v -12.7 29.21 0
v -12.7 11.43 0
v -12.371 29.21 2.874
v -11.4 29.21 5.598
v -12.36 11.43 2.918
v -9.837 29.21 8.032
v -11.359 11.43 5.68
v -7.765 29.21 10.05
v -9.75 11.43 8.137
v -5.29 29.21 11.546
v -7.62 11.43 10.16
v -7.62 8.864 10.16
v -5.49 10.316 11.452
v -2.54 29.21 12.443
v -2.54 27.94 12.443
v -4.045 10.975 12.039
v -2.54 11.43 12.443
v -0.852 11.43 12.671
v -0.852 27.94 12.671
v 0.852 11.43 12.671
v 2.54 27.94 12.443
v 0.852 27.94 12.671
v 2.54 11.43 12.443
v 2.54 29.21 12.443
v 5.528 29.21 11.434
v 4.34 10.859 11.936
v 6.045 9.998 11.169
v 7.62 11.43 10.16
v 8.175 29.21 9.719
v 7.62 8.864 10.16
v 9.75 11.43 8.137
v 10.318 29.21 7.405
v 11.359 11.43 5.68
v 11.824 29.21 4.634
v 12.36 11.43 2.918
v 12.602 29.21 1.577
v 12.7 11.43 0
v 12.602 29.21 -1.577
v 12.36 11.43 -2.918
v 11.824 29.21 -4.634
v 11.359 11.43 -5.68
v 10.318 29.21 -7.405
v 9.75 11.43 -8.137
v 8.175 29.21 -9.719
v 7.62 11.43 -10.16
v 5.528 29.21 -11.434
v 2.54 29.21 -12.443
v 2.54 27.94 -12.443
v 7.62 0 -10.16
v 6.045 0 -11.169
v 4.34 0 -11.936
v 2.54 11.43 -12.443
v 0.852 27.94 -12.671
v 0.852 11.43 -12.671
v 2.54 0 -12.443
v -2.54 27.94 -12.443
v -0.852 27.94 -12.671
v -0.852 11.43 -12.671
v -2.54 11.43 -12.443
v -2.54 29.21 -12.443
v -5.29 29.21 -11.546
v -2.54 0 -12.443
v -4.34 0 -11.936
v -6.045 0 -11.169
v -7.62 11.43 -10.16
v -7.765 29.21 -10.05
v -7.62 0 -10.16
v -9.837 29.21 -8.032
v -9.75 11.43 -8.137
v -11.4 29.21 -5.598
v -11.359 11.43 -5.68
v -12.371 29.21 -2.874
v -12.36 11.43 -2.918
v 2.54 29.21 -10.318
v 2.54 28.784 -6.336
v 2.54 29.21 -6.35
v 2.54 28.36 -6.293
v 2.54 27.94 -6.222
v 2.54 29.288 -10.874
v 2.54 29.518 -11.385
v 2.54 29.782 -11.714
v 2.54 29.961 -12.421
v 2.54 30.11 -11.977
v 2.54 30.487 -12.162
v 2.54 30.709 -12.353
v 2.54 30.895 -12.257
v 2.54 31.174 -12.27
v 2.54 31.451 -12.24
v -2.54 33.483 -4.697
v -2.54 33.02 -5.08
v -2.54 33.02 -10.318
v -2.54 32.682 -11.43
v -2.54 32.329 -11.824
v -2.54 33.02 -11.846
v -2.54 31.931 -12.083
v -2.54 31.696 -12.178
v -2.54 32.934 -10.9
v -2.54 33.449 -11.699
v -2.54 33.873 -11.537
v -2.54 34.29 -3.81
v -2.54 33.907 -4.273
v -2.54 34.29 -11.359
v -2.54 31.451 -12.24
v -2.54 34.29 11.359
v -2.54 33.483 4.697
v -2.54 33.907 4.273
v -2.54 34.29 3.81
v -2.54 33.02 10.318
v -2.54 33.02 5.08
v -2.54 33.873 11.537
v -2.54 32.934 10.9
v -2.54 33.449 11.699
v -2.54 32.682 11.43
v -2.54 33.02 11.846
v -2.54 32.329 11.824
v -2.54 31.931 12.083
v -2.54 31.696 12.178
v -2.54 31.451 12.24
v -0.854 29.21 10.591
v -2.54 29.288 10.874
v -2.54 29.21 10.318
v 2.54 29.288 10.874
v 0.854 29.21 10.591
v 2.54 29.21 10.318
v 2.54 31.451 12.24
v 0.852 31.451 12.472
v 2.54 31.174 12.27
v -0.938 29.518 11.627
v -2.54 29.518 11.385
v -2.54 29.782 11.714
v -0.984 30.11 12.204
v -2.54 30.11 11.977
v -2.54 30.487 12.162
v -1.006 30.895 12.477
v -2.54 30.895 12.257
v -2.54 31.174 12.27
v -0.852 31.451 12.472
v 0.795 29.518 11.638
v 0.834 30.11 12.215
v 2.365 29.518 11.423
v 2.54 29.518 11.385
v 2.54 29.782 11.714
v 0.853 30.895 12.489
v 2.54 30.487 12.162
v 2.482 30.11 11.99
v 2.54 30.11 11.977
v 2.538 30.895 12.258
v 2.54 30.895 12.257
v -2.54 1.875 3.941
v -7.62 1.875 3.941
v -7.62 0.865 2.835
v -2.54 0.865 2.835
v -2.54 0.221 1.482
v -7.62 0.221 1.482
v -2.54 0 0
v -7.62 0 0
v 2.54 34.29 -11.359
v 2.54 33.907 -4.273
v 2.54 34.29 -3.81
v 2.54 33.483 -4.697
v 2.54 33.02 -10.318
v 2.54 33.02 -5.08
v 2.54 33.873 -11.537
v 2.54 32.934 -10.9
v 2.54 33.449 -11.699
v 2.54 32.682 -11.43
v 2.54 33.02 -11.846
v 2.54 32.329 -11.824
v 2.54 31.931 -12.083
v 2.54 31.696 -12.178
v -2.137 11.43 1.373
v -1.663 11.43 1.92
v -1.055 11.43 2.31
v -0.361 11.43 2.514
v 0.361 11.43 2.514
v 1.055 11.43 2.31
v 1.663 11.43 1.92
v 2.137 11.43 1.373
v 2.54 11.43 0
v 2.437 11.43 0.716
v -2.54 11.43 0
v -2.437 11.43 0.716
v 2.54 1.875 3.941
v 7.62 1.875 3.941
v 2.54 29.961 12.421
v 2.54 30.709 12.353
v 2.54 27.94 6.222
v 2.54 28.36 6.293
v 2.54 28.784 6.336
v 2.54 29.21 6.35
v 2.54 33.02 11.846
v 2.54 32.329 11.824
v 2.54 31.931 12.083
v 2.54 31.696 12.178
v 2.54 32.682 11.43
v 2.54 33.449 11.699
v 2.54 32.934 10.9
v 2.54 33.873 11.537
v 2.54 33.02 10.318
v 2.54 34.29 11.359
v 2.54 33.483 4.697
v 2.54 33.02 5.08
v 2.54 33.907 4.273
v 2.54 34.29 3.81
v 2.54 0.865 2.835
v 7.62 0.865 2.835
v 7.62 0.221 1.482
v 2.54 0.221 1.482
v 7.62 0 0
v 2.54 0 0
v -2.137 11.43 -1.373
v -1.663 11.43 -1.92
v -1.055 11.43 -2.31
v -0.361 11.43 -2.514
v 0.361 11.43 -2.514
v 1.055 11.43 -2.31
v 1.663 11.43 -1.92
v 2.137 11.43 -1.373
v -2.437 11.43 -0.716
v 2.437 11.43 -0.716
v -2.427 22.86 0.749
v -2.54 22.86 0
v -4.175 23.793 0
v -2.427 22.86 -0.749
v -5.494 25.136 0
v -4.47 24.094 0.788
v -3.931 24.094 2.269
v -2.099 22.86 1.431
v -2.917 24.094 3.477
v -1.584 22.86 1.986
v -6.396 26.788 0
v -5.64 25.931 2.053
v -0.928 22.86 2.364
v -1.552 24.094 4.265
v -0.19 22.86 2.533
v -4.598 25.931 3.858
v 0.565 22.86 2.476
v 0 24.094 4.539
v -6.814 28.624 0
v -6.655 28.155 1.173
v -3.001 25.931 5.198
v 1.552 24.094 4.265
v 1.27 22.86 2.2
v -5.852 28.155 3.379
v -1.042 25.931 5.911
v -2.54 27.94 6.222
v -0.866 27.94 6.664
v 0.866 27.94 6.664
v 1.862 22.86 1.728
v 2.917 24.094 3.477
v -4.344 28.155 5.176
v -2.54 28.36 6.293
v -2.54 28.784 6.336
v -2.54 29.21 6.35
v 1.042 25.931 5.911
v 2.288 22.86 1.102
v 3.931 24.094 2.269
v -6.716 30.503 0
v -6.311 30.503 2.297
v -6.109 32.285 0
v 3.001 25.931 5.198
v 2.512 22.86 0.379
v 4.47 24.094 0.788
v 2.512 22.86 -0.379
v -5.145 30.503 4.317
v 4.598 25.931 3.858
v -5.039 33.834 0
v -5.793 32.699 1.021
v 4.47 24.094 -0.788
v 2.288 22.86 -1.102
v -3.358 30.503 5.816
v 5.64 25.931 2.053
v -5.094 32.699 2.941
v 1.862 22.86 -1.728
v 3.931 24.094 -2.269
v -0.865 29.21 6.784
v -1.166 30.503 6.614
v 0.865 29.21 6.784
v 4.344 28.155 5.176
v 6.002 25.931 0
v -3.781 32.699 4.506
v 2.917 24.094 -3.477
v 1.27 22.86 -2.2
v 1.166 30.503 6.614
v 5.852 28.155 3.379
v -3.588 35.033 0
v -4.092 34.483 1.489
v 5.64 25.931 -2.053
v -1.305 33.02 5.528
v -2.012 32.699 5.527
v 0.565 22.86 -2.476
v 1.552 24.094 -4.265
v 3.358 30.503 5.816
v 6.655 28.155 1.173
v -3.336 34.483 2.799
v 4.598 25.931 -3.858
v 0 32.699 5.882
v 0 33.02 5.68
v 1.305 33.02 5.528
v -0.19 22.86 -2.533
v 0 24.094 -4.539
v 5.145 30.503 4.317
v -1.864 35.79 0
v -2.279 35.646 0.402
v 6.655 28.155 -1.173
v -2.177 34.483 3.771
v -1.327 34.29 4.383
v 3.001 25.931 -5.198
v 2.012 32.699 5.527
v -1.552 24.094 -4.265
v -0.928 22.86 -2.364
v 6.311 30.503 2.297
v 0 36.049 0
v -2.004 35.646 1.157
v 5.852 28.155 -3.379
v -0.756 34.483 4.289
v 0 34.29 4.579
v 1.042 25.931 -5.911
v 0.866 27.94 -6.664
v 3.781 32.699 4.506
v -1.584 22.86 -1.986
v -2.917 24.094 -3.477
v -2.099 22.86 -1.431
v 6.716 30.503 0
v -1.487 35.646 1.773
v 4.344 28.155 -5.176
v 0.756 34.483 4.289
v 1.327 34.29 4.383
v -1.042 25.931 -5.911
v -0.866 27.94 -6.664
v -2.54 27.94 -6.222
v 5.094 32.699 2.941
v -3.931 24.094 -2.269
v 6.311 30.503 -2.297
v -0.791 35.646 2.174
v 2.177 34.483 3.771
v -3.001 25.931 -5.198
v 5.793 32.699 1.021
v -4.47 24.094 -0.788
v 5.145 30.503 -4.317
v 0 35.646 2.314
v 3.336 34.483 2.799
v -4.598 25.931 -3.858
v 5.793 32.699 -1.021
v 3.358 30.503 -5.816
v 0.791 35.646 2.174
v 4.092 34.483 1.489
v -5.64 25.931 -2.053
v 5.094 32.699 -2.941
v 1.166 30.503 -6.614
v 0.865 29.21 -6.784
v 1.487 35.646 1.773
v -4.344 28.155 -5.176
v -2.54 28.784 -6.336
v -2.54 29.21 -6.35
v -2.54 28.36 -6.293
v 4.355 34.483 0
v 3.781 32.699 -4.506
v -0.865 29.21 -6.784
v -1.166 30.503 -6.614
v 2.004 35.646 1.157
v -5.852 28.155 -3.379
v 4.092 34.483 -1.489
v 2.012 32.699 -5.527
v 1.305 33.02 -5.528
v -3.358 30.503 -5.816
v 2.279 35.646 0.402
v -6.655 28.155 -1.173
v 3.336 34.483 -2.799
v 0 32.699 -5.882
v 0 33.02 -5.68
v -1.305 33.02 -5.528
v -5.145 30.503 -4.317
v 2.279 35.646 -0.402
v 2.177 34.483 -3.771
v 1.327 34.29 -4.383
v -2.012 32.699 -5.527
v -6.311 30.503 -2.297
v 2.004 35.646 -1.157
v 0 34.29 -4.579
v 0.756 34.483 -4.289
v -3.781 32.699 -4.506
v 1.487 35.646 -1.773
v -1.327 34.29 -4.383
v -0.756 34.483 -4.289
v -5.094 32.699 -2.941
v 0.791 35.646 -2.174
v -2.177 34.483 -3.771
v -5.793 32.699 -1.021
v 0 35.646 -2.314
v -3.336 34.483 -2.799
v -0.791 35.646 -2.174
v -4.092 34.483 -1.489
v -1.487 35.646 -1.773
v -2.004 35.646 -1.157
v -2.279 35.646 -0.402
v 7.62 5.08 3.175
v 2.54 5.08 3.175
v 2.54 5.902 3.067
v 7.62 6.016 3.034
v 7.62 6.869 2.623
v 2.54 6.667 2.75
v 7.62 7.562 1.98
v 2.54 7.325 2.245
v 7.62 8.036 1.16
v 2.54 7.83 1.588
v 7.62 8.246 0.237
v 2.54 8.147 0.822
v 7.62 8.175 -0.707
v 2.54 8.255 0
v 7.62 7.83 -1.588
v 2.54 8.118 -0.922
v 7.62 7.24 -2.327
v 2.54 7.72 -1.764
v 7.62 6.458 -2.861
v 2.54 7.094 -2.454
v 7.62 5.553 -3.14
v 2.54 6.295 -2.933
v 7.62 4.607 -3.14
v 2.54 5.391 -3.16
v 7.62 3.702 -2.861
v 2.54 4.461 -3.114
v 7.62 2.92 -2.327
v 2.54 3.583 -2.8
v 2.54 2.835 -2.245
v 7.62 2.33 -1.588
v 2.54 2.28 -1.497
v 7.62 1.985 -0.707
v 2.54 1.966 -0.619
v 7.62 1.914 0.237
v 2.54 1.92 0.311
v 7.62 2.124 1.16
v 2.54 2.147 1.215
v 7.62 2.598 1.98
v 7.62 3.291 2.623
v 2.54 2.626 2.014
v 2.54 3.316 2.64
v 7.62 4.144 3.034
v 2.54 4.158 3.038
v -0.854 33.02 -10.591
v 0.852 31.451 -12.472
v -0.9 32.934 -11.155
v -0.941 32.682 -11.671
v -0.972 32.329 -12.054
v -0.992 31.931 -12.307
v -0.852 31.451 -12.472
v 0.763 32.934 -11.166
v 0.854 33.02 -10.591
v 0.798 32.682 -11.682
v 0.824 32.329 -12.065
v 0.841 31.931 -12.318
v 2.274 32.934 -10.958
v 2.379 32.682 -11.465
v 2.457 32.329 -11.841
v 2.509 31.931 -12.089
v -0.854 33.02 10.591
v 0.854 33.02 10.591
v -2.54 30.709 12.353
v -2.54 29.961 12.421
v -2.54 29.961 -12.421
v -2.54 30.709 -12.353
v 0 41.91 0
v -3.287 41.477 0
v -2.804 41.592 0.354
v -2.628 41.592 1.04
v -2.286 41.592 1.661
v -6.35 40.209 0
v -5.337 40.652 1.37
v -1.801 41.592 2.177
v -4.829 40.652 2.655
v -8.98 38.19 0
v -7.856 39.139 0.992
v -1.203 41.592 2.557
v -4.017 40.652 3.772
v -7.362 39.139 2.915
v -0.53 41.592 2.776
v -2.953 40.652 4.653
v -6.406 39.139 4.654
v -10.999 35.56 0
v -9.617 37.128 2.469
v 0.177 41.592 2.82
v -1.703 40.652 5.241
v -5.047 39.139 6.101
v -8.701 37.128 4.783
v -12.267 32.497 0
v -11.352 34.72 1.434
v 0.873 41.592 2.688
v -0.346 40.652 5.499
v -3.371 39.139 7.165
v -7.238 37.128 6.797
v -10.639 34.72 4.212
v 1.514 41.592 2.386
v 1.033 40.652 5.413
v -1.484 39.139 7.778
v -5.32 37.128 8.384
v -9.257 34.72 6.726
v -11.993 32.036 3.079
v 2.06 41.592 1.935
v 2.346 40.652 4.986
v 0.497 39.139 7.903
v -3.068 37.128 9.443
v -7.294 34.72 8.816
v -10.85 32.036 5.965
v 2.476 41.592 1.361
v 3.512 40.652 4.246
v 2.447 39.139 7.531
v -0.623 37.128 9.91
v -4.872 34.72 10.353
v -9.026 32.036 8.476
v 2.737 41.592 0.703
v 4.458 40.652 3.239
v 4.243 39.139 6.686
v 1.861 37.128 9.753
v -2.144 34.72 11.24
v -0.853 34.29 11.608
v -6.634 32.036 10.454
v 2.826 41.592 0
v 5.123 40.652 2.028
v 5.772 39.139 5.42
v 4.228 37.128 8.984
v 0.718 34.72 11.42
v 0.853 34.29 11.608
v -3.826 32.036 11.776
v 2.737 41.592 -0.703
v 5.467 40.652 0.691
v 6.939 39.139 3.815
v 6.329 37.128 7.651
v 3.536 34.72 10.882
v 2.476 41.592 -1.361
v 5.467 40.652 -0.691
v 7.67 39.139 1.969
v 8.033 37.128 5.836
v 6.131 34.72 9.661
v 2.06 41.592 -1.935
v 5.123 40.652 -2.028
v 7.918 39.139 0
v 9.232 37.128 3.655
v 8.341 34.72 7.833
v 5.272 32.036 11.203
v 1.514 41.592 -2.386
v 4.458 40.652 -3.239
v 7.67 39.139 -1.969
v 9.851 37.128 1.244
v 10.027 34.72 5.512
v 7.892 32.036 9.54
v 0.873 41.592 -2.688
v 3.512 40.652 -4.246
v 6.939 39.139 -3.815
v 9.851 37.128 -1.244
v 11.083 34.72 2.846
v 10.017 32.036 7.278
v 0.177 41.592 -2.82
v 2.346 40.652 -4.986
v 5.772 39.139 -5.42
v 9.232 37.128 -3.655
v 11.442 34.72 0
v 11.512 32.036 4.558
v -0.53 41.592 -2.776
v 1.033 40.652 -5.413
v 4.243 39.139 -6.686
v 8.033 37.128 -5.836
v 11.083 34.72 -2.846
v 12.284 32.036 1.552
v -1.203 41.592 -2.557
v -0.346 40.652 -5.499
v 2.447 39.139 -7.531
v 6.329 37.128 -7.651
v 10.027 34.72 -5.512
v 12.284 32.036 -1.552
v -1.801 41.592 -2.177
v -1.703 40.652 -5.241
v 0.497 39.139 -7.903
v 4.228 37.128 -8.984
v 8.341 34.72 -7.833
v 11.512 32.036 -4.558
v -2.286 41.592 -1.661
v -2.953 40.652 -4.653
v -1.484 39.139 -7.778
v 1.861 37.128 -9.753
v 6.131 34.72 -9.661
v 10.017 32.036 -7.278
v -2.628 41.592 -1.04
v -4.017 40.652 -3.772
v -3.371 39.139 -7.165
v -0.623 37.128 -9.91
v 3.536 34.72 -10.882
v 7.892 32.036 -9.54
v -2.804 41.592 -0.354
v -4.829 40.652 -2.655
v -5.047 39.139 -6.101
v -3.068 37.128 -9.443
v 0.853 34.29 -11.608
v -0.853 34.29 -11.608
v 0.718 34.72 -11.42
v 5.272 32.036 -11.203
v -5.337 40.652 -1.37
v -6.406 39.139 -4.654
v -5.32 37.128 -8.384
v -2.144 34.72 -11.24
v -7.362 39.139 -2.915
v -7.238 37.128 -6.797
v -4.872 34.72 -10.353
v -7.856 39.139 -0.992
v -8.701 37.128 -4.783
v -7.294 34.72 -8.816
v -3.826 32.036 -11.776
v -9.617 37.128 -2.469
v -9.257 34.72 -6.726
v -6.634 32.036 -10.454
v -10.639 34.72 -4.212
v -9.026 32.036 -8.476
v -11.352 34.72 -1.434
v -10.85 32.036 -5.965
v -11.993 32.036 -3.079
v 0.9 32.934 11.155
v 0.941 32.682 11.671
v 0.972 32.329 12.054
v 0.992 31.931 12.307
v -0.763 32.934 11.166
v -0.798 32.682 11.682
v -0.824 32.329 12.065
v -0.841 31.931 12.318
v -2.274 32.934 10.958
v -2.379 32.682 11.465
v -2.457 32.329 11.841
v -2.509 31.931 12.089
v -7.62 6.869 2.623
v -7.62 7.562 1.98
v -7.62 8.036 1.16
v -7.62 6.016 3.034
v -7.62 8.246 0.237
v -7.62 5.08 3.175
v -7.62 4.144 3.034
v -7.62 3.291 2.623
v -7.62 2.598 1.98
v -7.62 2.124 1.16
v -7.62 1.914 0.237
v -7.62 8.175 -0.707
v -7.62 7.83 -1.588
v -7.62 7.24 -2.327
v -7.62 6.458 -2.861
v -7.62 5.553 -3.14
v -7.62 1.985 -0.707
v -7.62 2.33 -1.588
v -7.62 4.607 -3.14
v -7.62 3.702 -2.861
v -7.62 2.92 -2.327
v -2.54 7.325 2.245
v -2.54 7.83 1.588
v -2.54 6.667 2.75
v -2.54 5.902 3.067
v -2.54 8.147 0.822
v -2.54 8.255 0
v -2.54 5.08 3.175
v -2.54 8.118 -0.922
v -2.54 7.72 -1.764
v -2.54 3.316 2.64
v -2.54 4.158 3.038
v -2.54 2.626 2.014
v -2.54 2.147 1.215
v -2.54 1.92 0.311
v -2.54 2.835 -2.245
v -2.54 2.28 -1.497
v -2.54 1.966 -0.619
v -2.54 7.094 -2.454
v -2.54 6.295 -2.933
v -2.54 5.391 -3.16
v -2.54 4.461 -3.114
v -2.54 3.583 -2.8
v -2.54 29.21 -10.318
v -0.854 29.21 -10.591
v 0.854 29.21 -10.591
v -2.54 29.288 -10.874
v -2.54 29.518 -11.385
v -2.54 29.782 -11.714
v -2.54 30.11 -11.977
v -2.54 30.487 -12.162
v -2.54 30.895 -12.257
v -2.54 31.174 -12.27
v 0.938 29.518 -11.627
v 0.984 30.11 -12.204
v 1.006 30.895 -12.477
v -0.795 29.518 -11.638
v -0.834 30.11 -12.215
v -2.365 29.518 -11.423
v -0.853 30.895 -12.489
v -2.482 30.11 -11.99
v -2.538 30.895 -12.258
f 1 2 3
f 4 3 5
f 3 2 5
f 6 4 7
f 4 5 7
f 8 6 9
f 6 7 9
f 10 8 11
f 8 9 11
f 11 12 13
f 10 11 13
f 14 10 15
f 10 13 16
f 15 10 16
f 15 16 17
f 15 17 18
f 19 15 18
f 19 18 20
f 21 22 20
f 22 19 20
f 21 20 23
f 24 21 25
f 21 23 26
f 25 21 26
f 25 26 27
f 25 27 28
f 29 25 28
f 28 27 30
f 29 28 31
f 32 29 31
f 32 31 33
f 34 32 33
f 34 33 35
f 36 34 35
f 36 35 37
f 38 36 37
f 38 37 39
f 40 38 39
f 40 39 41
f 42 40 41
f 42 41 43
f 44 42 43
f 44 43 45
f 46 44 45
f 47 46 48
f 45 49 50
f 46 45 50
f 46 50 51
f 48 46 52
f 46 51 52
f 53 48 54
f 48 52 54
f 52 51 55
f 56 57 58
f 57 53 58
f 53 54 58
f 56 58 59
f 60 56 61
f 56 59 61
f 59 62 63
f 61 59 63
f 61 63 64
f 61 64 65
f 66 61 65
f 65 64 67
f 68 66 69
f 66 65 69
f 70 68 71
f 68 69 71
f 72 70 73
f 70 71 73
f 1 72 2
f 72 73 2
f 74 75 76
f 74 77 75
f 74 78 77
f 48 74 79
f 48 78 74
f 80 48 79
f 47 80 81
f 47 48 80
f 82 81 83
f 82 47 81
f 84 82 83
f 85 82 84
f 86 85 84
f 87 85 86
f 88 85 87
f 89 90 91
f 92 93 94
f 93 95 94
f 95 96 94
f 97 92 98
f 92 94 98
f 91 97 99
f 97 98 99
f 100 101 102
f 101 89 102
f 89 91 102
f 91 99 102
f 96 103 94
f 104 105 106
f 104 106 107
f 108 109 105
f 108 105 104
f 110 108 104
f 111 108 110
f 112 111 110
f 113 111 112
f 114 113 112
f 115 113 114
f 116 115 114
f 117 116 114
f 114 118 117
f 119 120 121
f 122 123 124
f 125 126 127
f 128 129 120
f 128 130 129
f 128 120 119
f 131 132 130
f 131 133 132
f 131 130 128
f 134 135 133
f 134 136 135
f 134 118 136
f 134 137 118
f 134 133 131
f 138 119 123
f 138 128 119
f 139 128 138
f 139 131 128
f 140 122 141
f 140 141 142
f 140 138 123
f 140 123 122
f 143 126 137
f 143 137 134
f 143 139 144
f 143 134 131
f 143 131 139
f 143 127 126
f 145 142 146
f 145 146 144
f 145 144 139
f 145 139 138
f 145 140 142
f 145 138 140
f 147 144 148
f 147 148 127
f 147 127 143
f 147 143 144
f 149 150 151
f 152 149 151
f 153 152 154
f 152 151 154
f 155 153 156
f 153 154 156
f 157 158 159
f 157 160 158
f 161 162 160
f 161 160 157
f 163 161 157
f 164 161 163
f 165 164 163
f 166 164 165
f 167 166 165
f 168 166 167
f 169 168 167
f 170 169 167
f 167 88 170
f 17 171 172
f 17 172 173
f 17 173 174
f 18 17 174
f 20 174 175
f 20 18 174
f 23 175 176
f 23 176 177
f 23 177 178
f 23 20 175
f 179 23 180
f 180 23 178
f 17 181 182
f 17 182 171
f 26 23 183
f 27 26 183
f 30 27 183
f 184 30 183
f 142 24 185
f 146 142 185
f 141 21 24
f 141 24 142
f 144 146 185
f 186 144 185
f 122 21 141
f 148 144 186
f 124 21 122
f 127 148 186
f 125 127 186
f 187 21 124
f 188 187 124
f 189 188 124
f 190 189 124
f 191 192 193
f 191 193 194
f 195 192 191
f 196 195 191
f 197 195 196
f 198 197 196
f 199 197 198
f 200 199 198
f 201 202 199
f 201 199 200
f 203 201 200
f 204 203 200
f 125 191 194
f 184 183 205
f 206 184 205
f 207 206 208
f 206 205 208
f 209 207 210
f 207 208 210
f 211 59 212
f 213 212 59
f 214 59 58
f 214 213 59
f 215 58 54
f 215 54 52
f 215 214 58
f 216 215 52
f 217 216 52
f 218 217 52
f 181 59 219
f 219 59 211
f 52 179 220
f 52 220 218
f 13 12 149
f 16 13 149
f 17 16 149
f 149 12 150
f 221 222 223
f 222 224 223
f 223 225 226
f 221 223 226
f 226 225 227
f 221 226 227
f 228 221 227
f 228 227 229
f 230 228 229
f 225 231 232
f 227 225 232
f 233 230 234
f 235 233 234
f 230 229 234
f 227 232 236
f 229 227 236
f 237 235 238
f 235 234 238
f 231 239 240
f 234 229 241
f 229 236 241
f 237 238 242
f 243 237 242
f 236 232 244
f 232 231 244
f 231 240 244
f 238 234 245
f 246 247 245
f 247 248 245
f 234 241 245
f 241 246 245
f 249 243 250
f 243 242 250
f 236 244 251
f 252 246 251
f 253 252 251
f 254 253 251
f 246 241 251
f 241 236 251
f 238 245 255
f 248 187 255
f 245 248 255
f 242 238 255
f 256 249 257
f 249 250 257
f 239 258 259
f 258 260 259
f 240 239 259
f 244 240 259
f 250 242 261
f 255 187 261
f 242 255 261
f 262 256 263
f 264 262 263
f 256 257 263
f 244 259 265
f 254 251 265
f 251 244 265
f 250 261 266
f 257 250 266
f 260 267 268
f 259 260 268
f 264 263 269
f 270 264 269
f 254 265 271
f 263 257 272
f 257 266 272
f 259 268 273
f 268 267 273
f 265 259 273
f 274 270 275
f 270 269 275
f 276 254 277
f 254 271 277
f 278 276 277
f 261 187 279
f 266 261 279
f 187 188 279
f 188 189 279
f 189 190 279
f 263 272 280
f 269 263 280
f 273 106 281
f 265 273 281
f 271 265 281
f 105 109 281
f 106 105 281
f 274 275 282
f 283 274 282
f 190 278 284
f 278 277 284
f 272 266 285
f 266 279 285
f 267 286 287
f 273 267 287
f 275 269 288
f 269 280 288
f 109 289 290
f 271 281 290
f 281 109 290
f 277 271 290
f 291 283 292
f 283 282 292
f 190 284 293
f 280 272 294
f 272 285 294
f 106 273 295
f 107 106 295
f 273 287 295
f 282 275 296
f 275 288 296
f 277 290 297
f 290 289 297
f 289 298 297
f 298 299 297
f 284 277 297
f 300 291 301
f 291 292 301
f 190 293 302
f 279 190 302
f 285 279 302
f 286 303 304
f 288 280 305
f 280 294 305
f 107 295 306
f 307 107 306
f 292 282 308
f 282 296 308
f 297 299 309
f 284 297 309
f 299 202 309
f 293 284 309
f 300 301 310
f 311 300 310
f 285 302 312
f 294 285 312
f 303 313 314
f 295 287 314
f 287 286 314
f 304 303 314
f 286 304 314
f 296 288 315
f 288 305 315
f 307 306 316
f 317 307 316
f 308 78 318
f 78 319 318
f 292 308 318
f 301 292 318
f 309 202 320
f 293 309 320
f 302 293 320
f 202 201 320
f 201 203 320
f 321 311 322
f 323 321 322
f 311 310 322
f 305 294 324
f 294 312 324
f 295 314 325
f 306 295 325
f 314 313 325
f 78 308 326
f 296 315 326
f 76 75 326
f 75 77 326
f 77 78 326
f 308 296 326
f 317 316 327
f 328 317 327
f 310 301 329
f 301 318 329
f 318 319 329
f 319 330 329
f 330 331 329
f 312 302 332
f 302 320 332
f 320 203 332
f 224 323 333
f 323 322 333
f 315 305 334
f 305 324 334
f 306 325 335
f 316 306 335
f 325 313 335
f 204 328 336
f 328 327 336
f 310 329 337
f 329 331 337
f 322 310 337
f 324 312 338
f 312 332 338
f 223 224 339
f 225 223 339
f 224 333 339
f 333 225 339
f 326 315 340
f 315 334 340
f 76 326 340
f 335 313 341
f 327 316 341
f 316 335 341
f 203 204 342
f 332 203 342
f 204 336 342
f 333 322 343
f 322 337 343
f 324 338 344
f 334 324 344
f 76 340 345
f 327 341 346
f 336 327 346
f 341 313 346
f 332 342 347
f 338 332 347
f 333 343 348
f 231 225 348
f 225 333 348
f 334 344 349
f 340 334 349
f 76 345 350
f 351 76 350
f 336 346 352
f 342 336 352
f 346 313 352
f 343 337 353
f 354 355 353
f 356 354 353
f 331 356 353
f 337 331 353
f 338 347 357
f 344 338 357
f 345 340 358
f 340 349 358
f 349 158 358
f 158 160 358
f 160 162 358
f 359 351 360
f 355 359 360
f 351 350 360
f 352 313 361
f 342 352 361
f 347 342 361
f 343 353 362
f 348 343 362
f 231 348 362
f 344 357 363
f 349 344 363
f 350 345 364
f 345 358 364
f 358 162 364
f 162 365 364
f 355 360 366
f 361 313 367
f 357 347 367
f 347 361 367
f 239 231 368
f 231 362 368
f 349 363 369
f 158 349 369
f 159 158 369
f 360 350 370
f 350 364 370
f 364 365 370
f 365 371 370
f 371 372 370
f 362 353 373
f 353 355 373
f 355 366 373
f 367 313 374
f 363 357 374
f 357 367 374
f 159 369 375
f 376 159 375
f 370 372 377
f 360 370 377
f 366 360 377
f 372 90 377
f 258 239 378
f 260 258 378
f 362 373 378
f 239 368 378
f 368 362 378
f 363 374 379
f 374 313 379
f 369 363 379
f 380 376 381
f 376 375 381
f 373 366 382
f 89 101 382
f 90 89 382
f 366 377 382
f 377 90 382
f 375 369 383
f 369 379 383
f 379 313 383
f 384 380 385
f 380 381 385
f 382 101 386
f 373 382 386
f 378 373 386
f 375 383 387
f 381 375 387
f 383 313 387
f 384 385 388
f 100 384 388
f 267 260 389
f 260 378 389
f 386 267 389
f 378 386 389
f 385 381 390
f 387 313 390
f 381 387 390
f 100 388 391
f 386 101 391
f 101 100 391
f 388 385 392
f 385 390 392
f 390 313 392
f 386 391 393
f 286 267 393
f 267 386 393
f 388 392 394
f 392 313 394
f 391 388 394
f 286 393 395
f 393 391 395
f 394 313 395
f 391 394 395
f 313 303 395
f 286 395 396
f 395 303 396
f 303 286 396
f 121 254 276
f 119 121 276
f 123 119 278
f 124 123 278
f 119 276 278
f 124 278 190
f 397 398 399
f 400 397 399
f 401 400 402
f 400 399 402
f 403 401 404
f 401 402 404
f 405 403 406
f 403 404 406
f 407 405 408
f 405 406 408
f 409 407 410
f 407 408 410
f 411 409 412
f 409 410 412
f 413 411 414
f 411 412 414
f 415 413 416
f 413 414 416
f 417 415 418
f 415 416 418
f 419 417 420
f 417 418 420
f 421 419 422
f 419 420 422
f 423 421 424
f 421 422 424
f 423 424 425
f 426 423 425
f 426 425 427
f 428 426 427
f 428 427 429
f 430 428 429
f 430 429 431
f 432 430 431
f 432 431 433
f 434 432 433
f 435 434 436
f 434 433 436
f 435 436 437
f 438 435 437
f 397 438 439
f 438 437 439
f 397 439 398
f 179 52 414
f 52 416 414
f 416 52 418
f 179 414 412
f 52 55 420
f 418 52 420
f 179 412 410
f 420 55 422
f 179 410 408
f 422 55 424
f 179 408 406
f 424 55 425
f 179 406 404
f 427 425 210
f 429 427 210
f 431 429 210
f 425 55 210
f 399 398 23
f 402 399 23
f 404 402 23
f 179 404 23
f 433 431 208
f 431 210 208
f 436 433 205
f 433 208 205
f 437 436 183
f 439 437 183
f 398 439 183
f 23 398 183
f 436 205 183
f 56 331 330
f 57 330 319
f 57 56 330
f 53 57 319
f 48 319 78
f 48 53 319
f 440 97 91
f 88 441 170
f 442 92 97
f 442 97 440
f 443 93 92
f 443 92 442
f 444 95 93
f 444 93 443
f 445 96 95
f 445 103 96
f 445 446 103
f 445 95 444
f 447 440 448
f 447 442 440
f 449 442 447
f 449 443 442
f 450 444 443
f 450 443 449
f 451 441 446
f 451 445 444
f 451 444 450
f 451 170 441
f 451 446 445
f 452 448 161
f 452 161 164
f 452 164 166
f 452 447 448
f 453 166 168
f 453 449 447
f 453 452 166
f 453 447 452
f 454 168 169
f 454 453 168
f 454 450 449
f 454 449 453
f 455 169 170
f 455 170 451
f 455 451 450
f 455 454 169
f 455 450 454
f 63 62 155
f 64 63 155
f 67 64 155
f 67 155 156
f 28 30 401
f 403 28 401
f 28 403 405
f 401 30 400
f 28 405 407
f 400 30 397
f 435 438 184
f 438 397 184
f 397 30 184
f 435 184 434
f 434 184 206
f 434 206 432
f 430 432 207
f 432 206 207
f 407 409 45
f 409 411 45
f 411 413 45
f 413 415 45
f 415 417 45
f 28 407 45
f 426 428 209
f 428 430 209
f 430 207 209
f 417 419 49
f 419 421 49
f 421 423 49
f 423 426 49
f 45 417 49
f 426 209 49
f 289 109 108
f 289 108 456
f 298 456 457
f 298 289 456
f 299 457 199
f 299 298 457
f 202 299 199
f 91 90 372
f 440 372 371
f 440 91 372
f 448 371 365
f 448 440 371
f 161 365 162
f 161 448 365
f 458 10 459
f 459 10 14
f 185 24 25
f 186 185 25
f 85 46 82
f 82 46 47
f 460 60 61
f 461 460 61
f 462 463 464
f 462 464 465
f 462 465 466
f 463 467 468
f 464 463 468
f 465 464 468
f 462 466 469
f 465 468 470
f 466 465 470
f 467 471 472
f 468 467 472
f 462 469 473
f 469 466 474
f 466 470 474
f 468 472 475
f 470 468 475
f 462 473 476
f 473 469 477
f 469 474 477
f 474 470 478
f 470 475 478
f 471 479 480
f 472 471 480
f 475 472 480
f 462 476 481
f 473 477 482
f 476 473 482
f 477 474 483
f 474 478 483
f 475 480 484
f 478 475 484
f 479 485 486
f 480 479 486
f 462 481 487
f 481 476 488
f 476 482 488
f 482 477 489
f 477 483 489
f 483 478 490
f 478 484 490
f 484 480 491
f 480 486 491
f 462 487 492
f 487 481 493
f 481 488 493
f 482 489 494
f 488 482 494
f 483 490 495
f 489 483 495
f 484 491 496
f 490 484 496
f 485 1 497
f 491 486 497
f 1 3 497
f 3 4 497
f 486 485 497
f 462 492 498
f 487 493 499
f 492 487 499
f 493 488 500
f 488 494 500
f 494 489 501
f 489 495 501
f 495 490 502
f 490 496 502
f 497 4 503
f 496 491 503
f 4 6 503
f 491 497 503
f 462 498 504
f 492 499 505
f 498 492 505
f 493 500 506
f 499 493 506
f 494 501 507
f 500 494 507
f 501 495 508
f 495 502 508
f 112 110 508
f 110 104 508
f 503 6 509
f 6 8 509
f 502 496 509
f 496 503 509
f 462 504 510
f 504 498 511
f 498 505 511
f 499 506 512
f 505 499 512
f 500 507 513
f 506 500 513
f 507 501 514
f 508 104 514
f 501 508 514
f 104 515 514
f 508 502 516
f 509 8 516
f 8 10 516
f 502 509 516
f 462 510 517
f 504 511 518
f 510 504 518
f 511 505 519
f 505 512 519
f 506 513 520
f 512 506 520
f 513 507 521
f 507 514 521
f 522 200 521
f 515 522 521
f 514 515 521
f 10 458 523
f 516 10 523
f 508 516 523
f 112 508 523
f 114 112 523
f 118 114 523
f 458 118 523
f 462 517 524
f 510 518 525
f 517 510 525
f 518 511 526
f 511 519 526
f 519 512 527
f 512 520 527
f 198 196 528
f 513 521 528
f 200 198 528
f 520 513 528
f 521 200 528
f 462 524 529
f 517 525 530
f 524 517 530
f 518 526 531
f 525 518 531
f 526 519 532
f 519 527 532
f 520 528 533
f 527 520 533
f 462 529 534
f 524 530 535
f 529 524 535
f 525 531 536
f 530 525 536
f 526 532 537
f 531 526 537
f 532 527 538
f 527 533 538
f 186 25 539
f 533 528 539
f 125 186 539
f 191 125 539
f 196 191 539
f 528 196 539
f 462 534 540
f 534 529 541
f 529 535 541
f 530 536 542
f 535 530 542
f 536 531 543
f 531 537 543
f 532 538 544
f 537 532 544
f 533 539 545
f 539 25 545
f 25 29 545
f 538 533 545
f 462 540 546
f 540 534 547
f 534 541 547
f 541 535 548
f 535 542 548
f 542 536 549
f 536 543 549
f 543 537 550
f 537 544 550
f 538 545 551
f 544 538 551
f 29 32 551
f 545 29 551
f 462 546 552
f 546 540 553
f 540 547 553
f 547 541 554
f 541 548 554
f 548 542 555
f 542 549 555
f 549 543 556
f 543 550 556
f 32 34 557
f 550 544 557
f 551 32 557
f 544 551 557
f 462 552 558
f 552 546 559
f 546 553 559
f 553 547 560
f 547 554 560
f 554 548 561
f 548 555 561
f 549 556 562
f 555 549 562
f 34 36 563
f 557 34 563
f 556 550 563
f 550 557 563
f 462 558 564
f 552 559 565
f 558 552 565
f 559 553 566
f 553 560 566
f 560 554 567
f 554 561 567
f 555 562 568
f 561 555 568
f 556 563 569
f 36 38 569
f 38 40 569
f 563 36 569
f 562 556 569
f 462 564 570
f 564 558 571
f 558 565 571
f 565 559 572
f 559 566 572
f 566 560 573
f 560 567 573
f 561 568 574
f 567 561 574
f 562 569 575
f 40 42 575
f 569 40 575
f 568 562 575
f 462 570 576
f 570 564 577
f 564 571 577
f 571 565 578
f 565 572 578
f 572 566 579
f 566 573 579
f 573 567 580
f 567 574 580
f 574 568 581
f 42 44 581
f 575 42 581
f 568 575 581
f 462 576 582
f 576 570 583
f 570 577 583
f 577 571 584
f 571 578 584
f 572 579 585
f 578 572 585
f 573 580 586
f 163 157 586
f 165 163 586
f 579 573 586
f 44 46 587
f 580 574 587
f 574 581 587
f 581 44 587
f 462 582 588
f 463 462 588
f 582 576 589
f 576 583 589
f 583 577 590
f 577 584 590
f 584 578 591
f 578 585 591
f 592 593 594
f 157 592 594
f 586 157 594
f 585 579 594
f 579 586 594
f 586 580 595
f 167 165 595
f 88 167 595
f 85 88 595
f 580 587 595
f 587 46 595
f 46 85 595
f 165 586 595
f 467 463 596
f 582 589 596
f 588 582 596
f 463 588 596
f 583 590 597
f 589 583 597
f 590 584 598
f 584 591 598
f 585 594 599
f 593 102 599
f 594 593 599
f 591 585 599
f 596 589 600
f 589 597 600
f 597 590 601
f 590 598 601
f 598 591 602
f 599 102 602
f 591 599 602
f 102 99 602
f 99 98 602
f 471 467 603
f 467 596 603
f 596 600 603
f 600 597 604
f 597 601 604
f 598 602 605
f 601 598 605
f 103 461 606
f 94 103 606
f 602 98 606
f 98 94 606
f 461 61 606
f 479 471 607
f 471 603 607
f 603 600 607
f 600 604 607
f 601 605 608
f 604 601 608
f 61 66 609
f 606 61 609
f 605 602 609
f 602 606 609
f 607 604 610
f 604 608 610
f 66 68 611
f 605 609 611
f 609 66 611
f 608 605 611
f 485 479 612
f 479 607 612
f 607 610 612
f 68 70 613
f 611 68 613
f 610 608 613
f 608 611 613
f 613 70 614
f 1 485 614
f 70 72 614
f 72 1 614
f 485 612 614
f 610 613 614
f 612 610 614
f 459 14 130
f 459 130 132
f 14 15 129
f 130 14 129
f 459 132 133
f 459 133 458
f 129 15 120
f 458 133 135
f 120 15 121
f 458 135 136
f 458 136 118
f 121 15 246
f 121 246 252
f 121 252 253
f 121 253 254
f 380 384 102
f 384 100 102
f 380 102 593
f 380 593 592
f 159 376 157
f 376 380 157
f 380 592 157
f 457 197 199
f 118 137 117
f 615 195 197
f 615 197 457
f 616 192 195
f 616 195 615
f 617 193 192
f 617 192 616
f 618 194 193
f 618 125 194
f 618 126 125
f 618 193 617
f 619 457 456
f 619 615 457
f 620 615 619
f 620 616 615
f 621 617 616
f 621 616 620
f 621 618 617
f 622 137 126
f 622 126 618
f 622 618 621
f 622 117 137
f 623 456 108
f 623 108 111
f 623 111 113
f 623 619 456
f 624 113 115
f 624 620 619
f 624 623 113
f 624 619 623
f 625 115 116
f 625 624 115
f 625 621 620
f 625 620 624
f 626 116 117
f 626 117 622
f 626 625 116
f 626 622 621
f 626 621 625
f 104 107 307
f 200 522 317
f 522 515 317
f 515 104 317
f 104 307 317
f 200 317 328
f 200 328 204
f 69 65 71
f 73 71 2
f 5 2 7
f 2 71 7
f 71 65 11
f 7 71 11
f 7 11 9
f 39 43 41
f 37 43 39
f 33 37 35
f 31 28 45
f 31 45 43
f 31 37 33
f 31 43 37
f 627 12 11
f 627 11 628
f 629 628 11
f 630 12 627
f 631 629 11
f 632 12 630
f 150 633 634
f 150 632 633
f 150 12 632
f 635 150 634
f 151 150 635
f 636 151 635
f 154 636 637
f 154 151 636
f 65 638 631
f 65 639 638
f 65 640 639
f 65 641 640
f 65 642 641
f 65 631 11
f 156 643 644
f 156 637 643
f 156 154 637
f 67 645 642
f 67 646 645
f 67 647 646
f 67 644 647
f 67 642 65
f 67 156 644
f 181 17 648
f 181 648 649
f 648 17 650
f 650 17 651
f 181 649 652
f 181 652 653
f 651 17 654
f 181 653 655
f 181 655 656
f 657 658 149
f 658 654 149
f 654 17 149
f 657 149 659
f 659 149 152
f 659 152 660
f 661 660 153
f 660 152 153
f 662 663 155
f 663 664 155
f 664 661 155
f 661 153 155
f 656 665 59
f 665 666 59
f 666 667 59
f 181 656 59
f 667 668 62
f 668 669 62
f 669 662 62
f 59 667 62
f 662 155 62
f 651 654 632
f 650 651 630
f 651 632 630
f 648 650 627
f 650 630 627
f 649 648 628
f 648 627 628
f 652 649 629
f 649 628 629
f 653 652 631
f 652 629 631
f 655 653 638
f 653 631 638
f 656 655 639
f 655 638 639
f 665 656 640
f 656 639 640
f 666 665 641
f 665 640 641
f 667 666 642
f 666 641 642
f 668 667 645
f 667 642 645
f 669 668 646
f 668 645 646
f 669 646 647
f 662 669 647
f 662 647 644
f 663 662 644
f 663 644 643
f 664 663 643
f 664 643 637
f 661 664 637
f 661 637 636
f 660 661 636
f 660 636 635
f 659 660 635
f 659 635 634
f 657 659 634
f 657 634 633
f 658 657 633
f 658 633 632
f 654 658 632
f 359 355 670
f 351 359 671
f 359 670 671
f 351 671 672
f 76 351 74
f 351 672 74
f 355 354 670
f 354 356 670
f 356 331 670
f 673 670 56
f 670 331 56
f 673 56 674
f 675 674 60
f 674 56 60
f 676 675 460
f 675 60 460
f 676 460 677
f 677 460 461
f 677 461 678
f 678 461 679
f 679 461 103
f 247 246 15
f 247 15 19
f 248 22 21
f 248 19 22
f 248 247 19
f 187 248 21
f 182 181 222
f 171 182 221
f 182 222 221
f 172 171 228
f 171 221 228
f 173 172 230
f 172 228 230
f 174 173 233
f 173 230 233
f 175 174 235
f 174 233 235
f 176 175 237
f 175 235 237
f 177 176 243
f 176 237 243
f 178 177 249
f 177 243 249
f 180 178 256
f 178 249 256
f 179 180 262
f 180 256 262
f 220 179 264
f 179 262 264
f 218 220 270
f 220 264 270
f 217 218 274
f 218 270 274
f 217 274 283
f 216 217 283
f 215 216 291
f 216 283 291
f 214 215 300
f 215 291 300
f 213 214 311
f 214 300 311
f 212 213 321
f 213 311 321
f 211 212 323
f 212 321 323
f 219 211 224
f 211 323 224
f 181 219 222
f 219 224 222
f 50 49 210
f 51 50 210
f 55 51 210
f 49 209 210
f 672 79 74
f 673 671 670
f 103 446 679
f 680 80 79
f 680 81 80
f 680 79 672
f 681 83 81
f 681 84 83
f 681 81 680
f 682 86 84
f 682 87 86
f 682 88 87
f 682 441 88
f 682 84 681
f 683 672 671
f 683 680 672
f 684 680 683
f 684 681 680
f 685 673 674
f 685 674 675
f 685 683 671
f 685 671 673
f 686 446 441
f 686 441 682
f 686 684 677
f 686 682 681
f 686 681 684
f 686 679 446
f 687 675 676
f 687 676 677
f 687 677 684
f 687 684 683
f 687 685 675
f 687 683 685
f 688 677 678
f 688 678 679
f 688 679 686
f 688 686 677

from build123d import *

# Parameters (mm, degrees)
CUT_EXTRUDE1_DEPTH      = 11.43
SKETCH3_R               = 3.175
CUT_EXTRUDE2_DEPTH      = 49.276707634
CUT_EXTRUDE3_DEPTH      = 47.368046109
CUT_EXTRUDE3_DEPTH_BACK = 47.368046109
CUT_EXTRUDE5_DEPTH      = 46.5963606
CUT_EXTRUDE5_DEPTH_BACK = 46.5963606
SKETCH7_W               = 5.08
SKETCH7_H               = 1.27
FILLET1_R               = 1.905


with BuildPart() as part:
    # Sketch1 → Revolve1 (revolve)
    with BuildSketch(Plane.XY):
        with BuildLine():
            Line((0, 0), (0, 5.602635041))
            Line((0, 5.602635041), (-2.54, 5.602635041))
            Line((-2.54, 5.602635041), (-2.54, 22.86))
            ThreePointArc((-2.54, 22.86), (-6.715756159, 30.503336463), (0, 36.049159305))
            Line((0, 36.049159305), (0, 41.91))
            ThreePointArc((0, 41.91), (-8.980256121, 38.190256121), (-12.7, 29.21))
            Line((-12.7, 29.21), (-12.7, 0))
            Line((-12.7, 0), (0, 0))
        make_face()
    revolve(axis=Axis((0, 0, 0), (0, 1, 0)))

    # Sketch2 → Cut-Extrude1 (cut)
    with BuildSketch(Plane.XZ):
        with BuildLine():
            Line((-2.54, 12.443407893), (-2.54, -12.443407893))
            ThreePointArc((-2.54, -12.443407893), (0, -12.7), (2.54, -12.443407893))
            Line((2.54, -12.443407893), (2.54, 12.443407893))
            ThreePointArc((2.54, 12.443407893), (0, 12.7), (-2.54, 12.443407893))
        make_face()
        with BuildLine():
            Line((-7.62, 10.16), (-7.62, -10.16))
            ThreePointArc((-7.62, -10.16), (-12.7, 0), (-7.62, 10.16))
        make_face()
        with BuildLine():
            Line((7.62, 10.16), (7.62, -10.16))
            ThreePointArc((7.62, -10.16), (12.7, 0), (7.62, 10.16))
        make_face()
    extrude(amount=-CUT_EXTRUDE1_DEPTH, mode=Mode.SUBTRACT)

    # Sketch3 → Cut-Extrude2 (cut, through all)
    with BuildSketch(Plane.ZY.offset(7.62)):
        with Locations((0, 5.08)):
            Circle(SKETCH3_R)
    extrude(amount=-CUT_EXTRUDE2_DEPTH, mode=Mode.SUBTRACT)

    # Sketch4 → Cut-Extrude3 (cut, two sides: drawn at the far end of the back side and taken through both)
    with BuildSketch(Plane(origin=(-2.54, 0, 0), x_dir=(0, 0, -1), z_dir=(1, 0, 0)).offset(-CUT_EXTRUDE3_DEPTH_BACK)):
        with BuildLine():
            Line((-12.443407893, 11.43), (-3.94133892, 1.874965286))
            ThreePointArc((-3.94133892, 1.874965286), (-2.182295082, 0.492627313), (0, 0))
            Line((0, 0), (-12.443407893, 0))
            Line((-12.443407893, 0), (-12.443407893, 11.43))
        make_face()
    extrude(amount=CUT_EXTRUDE3_DEPTH + CUT_EXTRUDE3_DEPTH_BACK, mode=Mode.SUBTRACT)

    # Sketch7 → Cut-Extrude5 (cut, two sides: drawn at the far end of the back side and taken through both)
    with BuildSketch(Plane.XY.offset(-CUT_EXTRUDE5_DEPTH_BACK)):
        with Locations((0, 28.575)):
            Rectangle(SKETCH7_W, SKETCH7_H)
        with Locations((0, 33.655)):
            Rectangle(SKETCH7_W, SKETCH7_H)
    extrude(amount=CUT_EXTRUDE5_DEPTH + CUT_EXTRUDE5_DEPTH_BACK, mode=Mode.SUBTRACT)

    # Fillet1
    # the kernel refuses this fillet: 1.905 mm, written as the material it takes off along each edge
    with BuildSketch(Plane(origin=(0, 29.21, 0), x_dir=(-0.6006287696946588, 0, 0.7995280364159099), z_dir=(-0.7995280364159099, 0, -0.6006287696946588))) as fillet1_piece_1_section:
        with BuildLine():
            CenterArc((10.625582337, 1.905), FILLET1_R, 270, 100.164248622)
            Line((10.625582337, 0), (12.7, 0))
            ThreePointArc((12.7, 0), (12.650073138, 1.125010933), (12.500685102, 2.241176471))
        make_face()
    fillet1_piece_1 = revolve(axis=Axis((0, 29.21, 0), (0, 1, 0)), revolution_arc=73.829886486, mode=Mode.PRIVATE)
    fillet1_piece_1 = split(fillet1_piece_1, bisect_by=Plane(origin=(2.54, 29.726908465, 12.1243087), z_dir=(-1, 0, 0)), keep=Keep.TOP, mode=Mode.PRIVATE)
    fillet1_piece_1 = split(fillet1_piece_1, bisect_by=Plane(origin=(-2.54, 29.726908465, 12.1243087), z_dir=(1, 0, 0)), keep=Keep.TOP, mode=Mode.PRIVATE)
    add(fillet1_piece_1, mode=Mode.SUBTRACT)
    with BuildSketch(Plane(origin=(0, 33.02, 0), x_dir=(0.5180820301307637, 0, 0.8553309359865259), z_dir=(0.8553309359865259, 0, -0.5180820301307637))) as fillet1_piece_2_section:
        with BuildLine():
            CenterArc((10.625582337, 1.905), FILLET1_R, 270, 79.835751378)
            Line((10.625582337, 0), (12.115027858, 0))
            ThreePointArc((12.115027858, 0), (12.332827452, 0.778273257), (12.500685102, 1.568823529))
        make_face()
    fillet1_piece_2 = revolve(axis=Axis((0, 33.02, 0), (0, -1, 0)), revolution_arc=62.407371172, mode=Mode.PRIVATE)
    fillet1_piece_2 = split(fillet1_piece_2, bisect_by=Plane(origin=(-2.54, 32.67222625, 11.799196002), z_dir=(1, 0, 0)), keep=Keep.TOP, mode=Mode.PRIVATE)
    fillet1_piece_2 = split(fillet1_piece_2, bisect_by=Plane(origin=(2.54, 32.67222625, 11.799196002), z_dir=(-1, 0, 0)), keep=Keep.TOP, mode=Mode.PRIVATE)
    add(fillet1_piece_2, mode=Mode.SUBTRACT)
    with BuildSketch(Plane(origin=(0, 33.02, 0), x_dir=(-0.5180820301307628, 0, -0.8553309359865263), z_dir=(-0.8553309359865263, 0, 0.5180820301307628))) as fillet1_piece_3_section:
        with BuildLine():
            CenterArc((10.625582337, 1.905), FILLET1_R, 270, 79.835751378)
            Line((10.625582337, 0), (12.115027858, 0))
            ThreePointArc((12.115027858, 0), (12.332827452, 0.778273257), (12.500685102, 1.568823529))
        make_face()
    fillet1_piece_3 = revolve(axis=Axis((0, 33.02, 0), (0, -1, 0)), revolution_arc=62.407371172, mode=Mode.PRIVATE)
    fillet1_piece_3 = split(fillet1_piece_3, bisect_by=Plane(origin=(-2.54, 32.67222625, -11.799196002), z_dir=(1, 0, 0)), keep=Keep.TOP, mode=Mode.PRIVATE)
    fillet1_piece_3 = split(fillet1_piece_3, bisect_by=Plane(origin=(2.54, 32.67222625, -11.799196002), z_dir=(-1, 0, 0)), keep=Keep.TOP, mode=Mode.PRIVATE)
    add(fillet1_piece_3, mode=Mode.SUBTRACT)
    with BuildSketch(Plane(origin=(0, 29.21, 0), x_dir=(0.6006287696946002, 0, -0.7995280364159538), z_dir=(0.7995280364159538, 0, 0.6006287696946002))) as fillet1_piece_4_section:
        with BuildLine():
            CenterArc((10.625582337, 1.905), FILLET1_R, 270, 100.164248622)
            Line((10.625582337, 0), (12.7, 0))
            ThreePointArc((12.7, 0), (12.650073138, 1.125010933), (12.500685102, 2.241176471))
        make_face()
    fillet1_piece_4 = revolve(axis=Axis((0, 29.21, 0), (0, 1, 0)), revolution_arc=73.829886486, mode=Mode.PRIVATE)
    fillet1_piece_4 = split(fillet1_piece_4, bisect_by=Plane(origin=(-2.54, 29.726908465, -12.1243087), z_dir=(1, 0, 0)), keep=Keep.TOP, mode=Mode.PRIVATE)
    fillet1_piece_4 = split(fillet1_piece_4, bisect_by=Plane(origin=(2.54, 29.726908465, -12.1243087), z_dir=(-1, 0, 0)), keep=Keep.TOP, mode=Mode.PRIVATE)
    add(fillet1_piece_4, mode=Mode.SUBTRACT)


solid = part.part
